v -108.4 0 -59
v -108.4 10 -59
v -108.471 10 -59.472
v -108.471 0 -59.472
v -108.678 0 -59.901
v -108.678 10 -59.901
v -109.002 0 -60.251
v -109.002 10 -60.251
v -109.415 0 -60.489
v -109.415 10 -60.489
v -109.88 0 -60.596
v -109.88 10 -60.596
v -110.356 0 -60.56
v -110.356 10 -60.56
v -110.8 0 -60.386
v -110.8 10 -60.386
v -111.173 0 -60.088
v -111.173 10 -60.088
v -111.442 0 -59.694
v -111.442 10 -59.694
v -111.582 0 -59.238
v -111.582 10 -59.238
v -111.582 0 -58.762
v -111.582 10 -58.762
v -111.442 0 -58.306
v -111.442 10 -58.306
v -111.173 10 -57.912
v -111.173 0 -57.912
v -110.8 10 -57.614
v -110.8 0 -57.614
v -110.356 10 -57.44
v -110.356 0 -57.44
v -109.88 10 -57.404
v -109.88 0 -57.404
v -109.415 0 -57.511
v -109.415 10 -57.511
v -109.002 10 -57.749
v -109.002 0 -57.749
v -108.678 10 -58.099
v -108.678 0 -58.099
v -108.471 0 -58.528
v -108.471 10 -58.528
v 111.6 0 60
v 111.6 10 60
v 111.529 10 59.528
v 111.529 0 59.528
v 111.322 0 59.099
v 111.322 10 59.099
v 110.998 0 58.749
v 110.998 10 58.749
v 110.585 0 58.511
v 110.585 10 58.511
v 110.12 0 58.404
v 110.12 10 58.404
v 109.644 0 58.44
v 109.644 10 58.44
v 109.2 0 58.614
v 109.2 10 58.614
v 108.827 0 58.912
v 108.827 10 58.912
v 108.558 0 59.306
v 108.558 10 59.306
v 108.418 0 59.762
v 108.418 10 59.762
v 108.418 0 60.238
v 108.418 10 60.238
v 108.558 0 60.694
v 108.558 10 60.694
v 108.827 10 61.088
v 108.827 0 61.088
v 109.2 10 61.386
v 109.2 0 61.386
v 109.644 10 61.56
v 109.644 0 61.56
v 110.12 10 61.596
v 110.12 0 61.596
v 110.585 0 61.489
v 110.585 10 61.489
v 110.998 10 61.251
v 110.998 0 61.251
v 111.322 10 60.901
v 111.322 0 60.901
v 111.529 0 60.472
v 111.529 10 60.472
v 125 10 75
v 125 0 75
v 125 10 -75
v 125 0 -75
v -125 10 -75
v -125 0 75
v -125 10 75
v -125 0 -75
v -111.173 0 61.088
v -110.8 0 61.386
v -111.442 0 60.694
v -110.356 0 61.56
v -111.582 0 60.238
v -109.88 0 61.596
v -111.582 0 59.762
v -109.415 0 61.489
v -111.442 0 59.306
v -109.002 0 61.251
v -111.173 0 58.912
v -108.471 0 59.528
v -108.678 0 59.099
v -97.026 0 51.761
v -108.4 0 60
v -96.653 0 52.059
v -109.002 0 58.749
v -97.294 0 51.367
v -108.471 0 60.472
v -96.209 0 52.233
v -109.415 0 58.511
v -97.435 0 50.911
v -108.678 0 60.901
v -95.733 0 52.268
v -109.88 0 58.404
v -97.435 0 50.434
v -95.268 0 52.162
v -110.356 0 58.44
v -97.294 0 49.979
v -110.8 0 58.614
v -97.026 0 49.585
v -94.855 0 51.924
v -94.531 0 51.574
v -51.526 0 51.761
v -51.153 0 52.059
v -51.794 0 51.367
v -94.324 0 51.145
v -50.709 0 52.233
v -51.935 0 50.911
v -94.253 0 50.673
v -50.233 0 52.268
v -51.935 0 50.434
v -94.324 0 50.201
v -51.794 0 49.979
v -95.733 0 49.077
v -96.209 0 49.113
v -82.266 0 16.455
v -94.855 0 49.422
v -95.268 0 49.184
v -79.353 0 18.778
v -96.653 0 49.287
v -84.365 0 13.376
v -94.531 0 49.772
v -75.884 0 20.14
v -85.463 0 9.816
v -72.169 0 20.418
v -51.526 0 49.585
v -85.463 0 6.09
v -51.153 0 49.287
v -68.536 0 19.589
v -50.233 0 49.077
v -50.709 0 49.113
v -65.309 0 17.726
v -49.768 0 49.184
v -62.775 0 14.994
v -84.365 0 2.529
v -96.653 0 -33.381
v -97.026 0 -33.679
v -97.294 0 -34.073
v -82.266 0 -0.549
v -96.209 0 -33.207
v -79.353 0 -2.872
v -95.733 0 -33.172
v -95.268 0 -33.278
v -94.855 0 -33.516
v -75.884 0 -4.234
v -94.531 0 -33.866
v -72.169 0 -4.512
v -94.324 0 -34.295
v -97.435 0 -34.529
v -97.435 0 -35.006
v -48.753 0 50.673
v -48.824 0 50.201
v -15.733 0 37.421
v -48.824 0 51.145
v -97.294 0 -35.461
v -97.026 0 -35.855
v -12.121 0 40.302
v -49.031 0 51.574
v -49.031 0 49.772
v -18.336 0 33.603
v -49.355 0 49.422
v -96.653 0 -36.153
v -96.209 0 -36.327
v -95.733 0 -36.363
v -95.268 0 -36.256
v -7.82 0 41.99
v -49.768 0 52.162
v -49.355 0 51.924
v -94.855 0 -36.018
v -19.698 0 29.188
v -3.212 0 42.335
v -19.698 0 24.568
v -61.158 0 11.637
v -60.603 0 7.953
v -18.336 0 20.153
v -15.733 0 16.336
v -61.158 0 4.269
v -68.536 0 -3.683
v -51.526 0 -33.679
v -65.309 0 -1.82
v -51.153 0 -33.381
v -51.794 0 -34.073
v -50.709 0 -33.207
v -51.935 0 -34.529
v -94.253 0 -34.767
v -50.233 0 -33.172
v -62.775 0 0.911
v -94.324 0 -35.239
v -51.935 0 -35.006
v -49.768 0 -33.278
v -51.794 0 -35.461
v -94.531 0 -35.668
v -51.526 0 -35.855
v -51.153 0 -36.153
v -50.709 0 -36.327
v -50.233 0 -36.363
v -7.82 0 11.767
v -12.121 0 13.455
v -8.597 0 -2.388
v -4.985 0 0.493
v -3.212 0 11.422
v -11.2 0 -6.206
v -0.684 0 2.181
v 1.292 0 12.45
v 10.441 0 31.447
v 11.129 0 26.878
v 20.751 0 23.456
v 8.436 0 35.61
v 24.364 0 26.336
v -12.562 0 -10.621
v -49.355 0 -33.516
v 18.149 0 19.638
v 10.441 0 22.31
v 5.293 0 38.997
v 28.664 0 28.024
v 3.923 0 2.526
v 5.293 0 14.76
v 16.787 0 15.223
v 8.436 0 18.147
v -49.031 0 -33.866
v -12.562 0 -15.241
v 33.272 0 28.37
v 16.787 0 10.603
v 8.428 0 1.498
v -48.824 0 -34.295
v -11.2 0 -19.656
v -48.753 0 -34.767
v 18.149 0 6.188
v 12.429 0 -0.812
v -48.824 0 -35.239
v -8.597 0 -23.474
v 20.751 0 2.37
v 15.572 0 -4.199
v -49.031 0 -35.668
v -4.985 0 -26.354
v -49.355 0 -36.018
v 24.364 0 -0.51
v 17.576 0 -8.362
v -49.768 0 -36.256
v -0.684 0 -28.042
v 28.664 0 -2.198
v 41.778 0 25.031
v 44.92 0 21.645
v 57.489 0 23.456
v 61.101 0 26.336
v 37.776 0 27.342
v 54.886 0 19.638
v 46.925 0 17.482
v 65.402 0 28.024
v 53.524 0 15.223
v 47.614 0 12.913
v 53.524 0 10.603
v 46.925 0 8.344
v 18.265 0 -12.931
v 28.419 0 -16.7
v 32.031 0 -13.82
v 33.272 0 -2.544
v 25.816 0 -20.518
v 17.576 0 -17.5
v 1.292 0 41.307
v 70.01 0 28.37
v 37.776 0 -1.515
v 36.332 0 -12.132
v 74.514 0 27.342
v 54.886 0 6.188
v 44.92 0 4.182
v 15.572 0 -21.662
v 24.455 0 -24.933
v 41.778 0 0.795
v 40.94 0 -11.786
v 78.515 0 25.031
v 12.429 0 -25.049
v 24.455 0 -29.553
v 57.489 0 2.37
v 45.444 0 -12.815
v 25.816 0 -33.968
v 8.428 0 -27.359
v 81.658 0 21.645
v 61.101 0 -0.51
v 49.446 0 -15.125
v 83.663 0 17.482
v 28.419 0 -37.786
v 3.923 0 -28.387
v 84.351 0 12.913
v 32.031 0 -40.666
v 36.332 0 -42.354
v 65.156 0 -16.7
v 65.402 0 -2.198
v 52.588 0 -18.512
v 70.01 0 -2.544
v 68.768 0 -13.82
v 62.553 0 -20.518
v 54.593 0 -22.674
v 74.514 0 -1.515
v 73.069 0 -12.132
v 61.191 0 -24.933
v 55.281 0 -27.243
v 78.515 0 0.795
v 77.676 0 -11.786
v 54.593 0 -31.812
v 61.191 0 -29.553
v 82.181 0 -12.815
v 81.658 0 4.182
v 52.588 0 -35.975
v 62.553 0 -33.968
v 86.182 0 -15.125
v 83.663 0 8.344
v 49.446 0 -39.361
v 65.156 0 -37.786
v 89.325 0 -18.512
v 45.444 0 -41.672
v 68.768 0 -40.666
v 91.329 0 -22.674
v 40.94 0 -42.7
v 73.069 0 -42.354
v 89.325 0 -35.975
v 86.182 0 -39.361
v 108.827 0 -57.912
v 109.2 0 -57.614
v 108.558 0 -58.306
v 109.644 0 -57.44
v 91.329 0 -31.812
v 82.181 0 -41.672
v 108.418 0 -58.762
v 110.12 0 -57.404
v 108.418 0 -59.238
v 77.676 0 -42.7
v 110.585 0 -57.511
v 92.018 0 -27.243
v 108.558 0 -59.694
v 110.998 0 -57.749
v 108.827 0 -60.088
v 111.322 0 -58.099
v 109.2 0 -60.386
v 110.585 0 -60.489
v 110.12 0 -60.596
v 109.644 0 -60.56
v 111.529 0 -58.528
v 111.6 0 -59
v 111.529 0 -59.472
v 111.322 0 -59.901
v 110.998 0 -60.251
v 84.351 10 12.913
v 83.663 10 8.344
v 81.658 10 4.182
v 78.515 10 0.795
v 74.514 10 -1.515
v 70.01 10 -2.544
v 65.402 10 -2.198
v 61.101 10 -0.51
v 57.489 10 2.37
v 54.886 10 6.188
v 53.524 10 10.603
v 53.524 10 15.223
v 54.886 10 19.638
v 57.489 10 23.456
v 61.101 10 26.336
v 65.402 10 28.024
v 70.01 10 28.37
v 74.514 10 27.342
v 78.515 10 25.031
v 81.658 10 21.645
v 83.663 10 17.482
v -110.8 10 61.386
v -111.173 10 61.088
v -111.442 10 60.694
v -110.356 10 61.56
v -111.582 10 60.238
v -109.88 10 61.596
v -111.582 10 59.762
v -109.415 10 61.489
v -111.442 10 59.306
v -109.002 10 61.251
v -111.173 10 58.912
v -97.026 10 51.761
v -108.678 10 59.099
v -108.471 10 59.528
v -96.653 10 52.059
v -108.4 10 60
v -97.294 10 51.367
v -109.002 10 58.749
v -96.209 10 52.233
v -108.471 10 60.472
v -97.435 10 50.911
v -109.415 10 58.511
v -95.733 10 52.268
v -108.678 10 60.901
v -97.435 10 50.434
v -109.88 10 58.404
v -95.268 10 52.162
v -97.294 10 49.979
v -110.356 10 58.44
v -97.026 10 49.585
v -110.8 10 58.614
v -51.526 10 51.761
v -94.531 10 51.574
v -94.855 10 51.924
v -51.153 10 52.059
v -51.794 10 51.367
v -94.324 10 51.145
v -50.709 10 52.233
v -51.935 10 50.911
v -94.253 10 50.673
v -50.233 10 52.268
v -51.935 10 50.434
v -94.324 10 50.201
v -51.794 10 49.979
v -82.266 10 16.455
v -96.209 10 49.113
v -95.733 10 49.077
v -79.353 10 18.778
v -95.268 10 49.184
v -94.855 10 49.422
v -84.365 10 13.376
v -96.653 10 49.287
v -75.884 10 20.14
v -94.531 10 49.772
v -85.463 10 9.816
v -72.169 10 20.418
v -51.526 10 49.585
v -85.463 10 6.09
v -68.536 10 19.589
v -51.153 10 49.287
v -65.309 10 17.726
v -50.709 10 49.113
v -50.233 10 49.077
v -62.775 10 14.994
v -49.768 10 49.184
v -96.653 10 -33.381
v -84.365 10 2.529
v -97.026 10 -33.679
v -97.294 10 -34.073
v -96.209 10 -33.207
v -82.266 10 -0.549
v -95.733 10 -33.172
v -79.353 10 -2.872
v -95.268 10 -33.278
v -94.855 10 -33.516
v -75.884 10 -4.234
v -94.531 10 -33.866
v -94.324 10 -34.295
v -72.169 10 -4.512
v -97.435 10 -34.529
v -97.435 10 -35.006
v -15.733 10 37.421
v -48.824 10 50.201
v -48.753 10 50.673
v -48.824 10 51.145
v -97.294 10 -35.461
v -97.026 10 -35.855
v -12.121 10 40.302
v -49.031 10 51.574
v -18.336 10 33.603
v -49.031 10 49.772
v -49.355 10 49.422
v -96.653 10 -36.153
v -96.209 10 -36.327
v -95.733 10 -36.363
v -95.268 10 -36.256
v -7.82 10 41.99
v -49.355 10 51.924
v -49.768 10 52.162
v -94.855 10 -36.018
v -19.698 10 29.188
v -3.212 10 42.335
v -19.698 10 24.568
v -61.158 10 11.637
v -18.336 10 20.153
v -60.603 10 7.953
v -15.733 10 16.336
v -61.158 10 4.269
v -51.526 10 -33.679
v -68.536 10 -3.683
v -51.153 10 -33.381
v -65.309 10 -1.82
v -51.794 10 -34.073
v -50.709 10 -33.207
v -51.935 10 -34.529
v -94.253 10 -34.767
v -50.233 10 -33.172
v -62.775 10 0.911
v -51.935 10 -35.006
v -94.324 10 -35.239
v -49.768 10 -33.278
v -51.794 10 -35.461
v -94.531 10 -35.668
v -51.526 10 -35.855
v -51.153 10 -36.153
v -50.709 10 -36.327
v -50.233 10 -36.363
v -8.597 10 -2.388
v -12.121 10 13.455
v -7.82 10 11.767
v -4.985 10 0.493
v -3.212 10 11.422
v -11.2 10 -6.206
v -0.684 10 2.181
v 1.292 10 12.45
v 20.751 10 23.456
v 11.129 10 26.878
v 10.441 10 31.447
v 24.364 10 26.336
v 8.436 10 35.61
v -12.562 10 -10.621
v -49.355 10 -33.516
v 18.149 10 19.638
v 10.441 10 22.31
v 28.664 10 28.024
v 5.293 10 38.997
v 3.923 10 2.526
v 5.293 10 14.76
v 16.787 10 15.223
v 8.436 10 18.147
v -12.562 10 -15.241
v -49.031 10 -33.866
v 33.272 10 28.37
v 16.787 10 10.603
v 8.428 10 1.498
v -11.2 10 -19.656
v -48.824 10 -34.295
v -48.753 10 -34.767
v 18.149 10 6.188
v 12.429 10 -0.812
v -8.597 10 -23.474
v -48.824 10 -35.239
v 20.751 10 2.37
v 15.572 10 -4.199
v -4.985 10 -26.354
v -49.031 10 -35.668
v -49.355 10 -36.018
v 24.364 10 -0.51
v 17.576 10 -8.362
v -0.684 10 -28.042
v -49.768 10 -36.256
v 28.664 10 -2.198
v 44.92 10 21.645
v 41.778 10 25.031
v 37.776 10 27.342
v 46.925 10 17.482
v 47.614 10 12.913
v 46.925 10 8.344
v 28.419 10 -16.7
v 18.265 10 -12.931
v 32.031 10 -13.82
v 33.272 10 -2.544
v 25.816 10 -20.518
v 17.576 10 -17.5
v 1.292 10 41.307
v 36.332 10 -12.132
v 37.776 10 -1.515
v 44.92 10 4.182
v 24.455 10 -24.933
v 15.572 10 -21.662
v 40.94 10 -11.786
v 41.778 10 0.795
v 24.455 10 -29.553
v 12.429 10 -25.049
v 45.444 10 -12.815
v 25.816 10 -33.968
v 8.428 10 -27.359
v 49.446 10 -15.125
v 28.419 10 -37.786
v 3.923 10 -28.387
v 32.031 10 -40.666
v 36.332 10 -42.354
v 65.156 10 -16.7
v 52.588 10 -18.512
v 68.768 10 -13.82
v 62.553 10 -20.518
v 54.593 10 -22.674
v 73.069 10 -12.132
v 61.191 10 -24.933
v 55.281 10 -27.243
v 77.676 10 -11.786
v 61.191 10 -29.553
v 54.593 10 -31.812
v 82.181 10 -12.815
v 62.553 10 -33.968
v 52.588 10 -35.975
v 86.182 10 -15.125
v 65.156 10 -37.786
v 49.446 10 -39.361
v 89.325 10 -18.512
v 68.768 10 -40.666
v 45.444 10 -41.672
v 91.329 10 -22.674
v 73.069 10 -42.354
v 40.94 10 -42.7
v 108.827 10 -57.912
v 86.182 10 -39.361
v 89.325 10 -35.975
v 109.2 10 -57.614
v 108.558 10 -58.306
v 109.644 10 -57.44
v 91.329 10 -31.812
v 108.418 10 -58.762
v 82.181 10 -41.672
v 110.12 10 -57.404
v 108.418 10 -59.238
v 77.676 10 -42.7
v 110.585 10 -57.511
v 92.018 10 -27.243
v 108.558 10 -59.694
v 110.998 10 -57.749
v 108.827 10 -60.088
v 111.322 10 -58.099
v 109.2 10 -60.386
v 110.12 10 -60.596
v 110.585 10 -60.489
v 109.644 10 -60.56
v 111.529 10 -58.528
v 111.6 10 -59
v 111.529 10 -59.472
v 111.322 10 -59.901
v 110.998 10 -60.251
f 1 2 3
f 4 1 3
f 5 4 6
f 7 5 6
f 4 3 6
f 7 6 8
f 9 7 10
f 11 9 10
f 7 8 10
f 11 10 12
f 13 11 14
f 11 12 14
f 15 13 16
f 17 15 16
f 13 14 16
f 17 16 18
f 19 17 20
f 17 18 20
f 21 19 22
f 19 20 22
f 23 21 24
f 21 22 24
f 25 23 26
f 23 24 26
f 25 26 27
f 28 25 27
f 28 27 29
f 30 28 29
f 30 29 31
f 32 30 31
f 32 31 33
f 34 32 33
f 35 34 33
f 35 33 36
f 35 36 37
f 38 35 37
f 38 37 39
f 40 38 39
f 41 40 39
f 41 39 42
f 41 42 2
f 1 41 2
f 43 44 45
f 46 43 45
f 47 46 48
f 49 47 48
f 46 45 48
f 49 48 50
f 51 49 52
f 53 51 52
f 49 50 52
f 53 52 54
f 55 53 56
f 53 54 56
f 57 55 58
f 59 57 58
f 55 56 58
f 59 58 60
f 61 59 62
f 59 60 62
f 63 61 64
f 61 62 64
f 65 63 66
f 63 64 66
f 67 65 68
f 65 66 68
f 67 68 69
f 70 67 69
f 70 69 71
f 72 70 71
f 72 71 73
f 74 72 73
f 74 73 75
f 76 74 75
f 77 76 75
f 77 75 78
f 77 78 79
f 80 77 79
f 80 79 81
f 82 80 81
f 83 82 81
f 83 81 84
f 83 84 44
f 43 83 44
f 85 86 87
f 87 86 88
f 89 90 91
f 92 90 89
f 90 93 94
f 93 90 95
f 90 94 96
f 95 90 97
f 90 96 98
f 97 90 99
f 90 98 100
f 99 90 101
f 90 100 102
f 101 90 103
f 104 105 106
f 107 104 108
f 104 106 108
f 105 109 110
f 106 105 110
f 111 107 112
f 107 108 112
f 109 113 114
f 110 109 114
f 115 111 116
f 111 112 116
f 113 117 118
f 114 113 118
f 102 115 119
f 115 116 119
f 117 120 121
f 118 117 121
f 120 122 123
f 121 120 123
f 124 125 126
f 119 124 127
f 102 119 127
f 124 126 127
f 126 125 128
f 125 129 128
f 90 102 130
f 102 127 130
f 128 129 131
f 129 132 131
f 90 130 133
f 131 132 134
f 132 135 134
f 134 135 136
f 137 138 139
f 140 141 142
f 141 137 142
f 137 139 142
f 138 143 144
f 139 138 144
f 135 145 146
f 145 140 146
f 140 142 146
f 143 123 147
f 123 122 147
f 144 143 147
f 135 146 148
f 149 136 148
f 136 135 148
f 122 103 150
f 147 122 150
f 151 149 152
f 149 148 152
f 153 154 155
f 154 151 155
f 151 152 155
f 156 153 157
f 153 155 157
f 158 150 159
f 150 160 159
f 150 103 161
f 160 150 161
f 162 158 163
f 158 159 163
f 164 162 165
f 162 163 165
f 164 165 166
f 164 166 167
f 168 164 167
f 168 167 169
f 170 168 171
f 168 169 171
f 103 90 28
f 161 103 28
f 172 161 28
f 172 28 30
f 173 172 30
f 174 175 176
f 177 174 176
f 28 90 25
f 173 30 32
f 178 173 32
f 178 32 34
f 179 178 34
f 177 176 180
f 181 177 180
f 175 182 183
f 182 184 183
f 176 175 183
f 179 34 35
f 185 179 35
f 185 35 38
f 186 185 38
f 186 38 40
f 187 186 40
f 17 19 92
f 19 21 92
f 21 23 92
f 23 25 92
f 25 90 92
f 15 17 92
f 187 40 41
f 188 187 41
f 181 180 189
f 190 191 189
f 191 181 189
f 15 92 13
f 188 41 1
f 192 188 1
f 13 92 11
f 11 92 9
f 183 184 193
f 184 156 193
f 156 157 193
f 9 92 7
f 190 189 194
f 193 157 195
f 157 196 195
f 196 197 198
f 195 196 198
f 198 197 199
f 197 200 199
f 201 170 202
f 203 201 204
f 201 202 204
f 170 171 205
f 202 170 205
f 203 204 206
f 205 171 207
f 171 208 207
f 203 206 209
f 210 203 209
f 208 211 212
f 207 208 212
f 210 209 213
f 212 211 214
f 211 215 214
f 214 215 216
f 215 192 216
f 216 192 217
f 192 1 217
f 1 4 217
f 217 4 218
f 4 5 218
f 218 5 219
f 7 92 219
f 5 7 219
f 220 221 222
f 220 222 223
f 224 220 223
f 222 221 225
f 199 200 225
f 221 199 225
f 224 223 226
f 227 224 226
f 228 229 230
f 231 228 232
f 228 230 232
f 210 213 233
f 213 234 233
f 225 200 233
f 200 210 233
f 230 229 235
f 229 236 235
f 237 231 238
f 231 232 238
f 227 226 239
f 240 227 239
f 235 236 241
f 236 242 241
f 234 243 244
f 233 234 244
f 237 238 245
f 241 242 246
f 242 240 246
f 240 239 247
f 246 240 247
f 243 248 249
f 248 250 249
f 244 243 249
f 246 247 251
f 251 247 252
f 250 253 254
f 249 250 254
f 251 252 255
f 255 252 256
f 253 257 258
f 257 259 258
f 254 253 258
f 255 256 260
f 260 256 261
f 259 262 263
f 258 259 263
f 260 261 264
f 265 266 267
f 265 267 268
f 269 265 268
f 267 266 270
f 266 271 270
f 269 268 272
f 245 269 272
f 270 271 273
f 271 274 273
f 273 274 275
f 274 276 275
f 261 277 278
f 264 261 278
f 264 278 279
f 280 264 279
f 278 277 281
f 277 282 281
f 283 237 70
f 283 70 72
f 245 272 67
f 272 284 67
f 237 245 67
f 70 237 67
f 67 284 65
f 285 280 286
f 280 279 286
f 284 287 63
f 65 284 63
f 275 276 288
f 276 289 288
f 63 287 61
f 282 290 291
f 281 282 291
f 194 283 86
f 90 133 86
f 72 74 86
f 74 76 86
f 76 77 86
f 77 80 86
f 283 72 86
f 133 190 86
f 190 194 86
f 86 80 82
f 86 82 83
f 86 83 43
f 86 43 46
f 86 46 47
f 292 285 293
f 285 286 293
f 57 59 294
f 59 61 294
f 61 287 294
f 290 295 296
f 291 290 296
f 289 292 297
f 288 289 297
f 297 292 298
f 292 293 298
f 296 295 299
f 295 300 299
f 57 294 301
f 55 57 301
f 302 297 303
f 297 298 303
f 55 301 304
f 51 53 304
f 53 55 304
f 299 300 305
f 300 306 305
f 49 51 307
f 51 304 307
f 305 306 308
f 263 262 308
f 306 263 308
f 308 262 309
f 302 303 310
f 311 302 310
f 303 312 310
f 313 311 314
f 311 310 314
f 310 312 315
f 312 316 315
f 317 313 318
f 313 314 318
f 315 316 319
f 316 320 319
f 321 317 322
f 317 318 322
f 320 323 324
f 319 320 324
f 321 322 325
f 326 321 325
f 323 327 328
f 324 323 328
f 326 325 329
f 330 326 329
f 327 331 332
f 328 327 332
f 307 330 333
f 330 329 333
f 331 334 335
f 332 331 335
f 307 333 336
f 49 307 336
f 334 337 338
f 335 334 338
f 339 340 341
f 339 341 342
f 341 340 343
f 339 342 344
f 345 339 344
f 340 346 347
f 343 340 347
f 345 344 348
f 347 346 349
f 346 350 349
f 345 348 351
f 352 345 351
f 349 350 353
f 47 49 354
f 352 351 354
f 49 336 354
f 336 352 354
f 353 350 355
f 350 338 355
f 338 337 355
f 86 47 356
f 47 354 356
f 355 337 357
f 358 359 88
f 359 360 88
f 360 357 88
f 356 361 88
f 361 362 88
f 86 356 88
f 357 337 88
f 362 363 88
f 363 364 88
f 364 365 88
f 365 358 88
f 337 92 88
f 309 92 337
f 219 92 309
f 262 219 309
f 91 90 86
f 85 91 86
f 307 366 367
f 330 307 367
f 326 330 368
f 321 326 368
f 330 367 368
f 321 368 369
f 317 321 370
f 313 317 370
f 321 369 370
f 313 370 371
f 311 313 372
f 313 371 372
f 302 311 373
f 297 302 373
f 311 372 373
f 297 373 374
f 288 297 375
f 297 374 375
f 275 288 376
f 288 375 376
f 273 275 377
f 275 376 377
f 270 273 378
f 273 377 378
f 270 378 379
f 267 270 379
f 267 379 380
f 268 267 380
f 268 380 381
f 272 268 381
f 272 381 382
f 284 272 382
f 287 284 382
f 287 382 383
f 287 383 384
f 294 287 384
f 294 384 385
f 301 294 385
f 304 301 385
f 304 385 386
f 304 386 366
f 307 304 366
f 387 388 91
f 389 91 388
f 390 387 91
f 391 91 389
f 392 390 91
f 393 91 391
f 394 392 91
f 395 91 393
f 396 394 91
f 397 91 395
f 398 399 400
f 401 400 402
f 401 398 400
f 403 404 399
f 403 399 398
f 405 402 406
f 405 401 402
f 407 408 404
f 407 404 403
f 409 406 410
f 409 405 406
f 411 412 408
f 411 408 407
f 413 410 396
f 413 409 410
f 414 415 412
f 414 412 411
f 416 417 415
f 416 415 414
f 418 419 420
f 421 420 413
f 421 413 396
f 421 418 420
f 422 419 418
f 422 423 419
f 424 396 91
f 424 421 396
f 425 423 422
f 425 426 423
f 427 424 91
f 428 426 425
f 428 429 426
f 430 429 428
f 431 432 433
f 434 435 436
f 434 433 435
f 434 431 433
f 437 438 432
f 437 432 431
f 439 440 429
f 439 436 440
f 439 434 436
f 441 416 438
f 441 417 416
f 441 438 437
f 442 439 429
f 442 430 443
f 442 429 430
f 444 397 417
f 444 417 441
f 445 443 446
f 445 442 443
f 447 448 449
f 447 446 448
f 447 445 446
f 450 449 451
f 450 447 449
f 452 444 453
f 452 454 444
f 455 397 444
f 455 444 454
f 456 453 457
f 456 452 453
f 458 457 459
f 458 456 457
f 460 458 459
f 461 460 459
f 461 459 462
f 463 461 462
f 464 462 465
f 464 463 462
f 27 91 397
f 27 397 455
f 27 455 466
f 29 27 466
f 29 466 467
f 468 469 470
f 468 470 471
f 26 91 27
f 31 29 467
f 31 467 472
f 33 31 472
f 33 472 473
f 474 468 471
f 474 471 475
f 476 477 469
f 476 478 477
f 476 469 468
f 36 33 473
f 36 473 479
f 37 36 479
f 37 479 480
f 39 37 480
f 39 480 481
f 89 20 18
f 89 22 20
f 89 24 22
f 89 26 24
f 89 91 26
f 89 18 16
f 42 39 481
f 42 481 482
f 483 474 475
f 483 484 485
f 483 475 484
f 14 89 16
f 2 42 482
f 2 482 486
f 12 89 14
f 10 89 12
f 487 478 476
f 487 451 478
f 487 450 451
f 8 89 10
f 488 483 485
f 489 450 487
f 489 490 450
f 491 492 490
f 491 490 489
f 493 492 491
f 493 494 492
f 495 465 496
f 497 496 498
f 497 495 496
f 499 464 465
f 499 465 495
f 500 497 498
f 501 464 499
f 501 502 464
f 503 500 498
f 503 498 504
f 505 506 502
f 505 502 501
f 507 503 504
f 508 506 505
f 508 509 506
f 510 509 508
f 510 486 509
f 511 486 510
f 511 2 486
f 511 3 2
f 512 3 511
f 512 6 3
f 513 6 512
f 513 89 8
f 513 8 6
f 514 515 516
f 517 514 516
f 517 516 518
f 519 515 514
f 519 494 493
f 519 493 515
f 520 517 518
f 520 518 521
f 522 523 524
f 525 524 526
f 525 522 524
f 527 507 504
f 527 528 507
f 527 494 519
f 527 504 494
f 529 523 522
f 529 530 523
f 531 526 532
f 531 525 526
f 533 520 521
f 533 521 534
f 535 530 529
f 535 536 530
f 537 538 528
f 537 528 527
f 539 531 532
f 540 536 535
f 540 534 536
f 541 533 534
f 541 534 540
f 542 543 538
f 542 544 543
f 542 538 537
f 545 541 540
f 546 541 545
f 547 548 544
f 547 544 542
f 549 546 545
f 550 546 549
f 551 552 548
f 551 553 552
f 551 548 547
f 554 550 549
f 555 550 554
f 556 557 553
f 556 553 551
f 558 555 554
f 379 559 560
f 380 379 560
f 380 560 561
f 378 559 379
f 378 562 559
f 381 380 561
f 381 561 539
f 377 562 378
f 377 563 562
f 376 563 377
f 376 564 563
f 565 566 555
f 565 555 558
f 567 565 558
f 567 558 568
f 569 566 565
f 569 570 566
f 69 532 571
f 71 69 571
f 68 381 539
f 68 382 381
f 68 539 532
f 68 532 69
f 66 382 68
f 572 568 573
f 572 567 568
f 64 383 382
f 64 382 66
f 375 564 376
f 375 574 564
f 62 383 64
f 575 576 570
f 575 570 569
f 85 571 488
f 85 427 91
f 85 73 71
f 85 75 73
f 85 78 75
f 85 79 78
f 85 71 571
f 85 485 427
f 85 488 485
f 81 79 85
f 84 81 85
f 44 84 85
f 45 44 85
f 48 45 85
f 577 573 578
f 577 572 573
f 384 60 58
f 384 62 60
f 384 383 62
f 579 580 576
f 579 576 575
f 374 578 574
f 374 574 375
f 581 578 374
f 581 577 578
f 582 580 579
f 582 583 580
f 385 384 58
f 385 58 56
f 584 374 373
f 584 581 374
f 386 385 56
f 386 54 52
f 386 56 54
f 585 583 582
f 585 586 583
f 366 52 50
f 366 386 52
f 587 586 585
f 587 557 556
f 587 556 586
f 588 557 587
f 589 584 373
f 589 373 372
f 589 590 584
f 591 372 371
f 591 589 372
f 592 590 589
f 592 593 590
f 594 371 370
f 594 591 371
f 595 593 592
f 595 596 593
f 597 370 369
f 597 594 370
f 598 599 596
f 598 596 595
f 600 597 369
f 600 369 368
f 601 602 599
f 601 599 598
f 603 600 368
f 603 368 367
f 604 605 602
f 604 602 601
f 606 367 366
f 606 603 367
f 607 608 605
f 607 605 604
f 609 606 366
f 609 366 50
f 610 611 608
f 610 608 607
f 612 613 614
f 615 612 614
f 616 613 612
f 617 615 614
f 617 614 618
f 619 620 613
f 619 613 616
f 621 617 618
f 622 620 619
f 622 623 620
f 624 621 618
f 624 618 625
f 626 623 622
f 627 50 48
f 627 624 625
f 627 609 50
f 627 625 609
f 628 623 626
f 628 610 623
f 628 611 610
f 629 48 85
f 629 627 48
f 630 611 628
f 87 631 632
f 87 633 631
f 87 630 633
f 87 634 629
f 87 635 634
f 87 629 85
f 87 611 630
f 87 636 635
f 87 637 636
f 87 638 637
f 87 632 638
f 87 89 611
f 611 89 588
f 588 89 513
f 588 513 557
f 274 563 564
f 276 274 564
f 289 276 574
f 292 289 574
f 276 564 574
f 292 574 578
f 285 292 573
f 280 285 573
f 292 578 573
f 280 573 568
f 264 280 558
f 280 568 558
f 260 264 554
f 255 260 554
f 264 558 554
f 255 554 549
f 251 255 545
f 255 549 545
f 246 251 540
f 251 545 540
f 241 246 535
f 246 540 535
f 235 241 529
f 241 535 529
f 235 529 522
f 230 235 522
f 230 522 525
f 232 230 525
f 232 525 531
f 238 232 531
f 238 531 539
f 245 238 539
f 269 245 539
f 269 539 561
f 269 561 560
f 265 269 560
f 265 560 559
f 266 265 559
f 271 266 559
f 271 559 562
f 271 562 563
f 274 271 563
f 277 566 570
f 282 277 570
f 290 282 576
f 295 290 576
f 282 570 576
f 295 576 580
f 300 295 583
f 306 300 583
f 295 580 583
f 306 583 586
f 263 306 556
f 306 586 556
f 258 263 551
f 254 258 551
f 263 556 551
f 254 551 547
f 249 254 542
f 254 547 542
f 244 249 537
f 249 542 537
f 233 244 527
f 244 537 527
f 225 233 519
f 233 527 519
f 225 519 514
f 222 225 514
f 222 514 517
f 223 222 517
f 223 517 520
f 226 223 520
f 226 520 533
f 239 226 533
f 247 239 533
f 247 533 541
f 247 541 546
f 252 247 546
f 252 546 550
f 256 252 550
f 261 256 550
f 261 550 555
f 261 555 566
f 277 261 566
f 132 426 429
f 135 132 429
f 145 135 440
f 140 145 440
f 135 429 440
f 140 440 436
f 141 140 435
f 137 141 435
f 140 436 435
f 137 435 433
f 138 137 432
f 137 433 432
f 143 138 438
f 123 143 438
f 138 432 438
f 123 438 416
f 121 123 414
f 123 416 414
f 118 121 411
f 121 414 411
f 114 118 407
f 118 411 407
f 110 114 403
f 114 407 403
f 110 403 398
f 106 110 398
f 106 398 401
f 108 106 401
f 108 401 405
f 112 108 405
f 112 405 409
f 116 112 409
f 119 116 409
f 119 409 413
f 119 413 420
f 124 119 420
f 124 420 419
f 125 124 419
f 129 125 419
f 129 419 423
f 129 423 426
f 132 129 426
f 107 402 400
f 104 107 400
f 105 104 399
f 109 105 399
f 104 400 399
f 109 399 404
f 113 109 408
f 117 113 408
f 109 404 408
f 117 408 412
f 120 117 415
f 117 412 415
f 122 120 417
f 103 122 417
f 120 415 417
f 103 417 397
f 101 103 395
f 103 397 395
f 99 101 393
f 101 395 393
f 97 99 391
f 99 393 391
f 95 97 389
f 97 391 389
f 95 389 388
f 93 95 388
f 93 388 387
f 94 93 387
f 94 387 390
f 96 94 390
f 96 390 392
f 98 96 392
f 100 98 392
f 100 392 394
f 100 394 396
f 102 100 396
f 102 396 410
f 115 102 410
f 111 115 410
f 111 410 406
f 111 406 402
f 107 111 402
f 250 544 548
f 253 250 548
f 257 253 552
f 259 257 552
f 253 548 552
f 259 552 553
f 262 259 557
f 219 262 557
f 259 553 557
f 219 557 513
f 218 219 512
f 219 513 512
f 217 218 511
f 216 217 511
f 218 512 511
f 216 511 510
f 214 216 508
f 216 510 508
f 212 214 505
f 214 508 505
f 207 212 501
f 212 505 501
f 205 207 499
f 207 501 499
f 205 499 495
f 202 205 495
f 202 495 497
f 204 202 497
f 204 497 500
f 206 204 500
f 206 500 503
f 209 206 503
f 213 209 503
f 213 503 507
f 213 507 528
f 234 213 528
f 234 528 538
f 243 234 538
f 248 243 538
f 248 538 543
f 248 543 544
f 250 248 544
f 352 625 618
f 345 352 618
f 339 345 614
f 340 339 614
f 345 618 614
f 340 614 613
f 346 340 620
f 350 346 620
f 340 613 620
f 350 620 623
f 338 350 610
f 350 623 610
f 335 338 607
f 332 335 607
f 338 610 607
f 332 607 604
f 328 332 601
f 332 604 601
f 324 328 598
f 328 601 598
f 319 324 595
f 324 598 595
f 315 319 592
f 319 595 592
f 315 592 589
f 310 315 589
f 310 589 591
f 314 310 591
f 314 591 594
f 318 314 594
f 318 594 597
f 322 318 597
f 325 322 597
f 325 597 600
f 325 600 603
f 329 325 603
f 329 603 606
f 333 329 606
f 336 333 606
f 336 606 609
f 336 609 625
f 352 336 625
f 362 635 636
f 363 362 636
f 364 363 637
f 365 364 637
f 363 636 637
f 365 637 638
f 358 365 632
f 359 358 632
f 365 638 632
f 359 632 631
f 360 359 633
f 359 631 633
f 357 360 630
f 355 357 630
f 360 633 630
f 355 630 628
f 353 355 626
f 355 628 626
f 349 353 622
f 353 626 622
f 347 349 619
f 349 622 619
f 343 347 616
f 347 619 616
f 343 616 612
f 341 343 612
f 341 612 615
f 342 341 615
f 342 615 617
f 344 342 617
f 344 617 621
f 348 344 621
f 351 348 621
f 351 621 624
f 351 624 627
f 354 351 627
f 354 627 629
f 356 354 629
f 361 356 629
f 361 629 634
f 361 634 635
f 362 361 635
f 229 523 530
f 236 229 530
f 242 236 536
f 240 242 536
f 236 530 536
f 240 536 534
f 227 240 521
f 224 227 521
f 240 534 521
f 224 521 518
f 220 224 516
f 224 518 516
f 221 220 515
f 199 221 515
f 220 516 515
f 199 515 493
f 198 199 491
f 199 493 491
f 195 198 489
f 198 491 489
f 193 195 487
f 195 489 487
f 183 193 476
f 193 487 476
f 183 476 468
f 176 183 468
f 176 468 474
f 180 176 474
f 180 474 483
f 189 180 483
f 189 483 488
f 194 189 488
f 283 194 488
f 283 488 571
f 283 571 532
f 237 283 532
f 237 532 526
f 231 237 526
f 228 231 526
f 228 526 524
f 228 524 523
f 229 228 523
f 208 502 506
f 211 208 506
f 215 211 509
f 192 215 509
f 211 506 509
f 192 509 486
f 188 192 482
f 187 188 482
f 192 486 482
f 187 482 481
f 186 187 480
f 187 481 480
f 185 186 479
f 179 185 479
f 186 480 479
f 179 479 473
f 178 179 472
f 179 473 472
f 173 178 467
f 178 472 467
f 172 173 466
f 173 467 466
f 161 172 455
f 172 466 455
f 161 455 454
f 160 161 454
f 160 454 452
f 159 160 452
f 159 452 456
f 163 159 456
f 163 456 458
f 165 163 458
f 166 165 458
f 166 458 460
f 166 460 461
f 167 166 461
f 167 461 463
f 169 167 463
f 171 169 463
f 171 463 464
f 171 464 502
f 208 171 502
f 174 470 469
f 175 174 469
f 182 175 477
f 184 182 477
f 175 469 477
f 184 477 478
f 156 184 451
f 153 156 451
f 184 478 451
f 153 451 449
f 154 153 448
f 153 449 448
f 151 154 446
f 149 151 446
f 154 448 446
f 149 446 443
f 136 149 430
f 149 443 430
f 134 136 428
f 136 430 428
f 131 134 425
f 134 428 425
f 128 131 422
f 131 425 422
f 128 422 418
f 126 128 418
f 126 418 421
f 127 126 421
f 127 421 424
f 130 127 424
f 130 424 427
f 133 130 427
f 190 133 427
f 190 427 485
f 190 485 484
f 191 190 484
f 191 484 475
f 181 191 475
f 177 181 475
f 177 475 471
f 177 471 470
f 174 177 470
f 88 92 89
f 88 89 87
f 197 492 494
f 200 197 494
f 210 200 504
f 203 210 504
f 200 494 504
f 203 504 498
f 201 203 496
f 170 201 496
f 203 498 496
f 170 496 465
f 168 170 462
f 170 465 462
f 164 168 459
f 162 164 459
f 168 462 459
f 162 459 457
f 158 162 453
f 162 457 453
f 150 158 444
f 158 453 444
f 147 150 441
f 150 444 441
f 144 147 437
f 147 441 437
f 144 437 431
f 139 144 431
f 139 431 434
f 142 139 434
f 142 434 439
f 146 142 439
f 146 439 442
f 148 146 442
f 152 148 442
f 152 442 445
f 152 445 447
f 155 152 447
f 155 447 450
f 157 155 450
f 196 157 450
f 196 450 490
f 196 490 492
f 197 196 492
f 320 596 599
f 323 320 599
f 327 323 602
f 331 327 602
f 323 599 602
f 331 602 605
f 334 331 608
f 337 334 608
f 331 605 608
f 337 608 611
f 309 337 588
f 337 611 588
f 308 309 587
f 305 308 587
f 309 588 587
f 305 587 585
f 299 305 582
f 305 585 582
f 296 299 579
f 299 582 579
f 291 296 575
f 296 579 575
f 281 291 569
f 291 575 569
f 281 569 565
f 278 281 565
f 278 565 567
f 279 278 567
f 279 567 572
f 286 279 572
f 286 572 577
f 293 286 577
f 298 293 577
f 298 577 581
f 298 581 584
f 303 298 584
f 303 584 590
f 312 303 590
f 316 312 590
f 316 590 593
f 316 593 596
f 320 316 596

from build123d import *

# Parameters (mm, degrees)
CROQUIS1_W              = 250
CROQUIS1_H              = 150
SALIENTE_EXTRUIR1_DEPTH = 10
CORTAR_EXTRUIR1_REACH   = 12
CROQUIS2_R              = 12.5
CROQUIS2_R_2            = 15.5
CORTAR_EXTRUIR2_REACH   = 12
CROQUIS3_R              = 1.6


with BuildPart() as part:
    # Croquis1 → Saliente-Extruir1 (new body)
    with BuildSketch(Plane(origin=(0, 0, 0), x_dir=(1, 0, 0), z_dir=(0, 1, 0))):
        Rectangle(CROQUIS1_W, CROQUIS1_H)
    extrude(amount=SALIENTE_EXTRUIR1_DEPTH)

    # Croquis2 → Cortar-Extruir1 (cut, up to next)
    with BuildSketch(Plane(origin=(0, 10, 0), x_dir=(1, 0, 0), z_dir=(0, 1, 0)), mode=Mode.PRIVATE) as cortar_extruir1_sk1:
        with Locations((-73.102687588, -7.952940163)):
            Circle(CROQUIS2_R)
    cortar_extruir1_tool1 = extrude(cortar_extruir1_sk1.sketch, amount=-CORTAR_EXTRUIR1_REACH, mode=Mode.PRIVATE) & part.part
    add(cortar_extruir1_tool1.solids().sort_by_distance((-73.102688, 10, 7.95294))[0], mode=Mode.SUBTRACT)
    # Croquis2 → Cortar-Extruir1 (cut, up to next)
    with BuildSketch(Plane(origin=(0, 10, 0), x_dir=(1, 0, 0), z_dir=(0, 1, 0)), mode=Mode.PRIVATE) as cortar_extruir1_sk2:
        with Locations((-4.370803181, -26.878296525)):
            Circle(CROQUIS2_R_2)
    cortar_extruir1_tool2 = extrude(cortar_extruir1_sk2.sketch, amount=-CORTAR_EXTRUIR1_REACH, mode=Mode.PRIVATE) & part.part
    add(cortar_extruir1_tool2.solids().sort_by_distance((-4.370803, 10, 26.878297))[0], mode=Mode.SUBTRACT)
    # Croquis2 → Cortar-Extruir1 (cut, up to next)
    with BuildSketch(Plane(origin=(0, 10, 0), x_dir=(1, 0, 0), z_dir=(0, 1, 0)), mode=Mode.PRIVATE) as cortar_extruir1_sk3:
        with Locations((2.765040009, 12.93083036)):
            Circle(CROQUIS2_R_2)
    cortar_extruir1_tool3 = extrude(cortar_extruir1_sk3.sketch, amount=-CORTAR_EXTRUIR1_REACH, mode=Mode.PRIVATE) & part.part
    add(cortar_extruir1_tool3.solids().sort_by_distance((2.76504, 10, -12.93083))[0], mode=Mode.SUBTRACT)
    # Croquis2 → Cortar-Extruir1 (cut, up to next)
    with BuildSketch(Plane(origin=(0, 10, 0), x_dir=(1, 0, 0), z_dir=(0, 1, 0)), mode=Mode.PRIVATE) as cortar_extruir1_sk4:
        with Locations((39.781486463, 27.243051559)):
            Circle(CROQUIS2_R_2)
    cortar_extruir1_tool4 = extrude(cortar_extruir1_sk4.sketch, amount=-CORTAR_EXTRUIR1_REACH, mode=Mode.PRIVATE) & part.part
    add(cortar_extruir1_tool4.solids().sort_by_distance((39.781486, 10, -27.243052))[0], mode=Mode.SUBTRACT)
    # Croquis2 → Cortar-Extruir1 (cut, up to next)
    with BuildSketch(Plane(origin=(0, 10, 0), x_dir=(1, 0, 0), z_dir=(0, 1, 0)), mode=Mode.PRIVATE) as cortar_extruir1_sk5:
        with Locations((76.517860202, 27.243051559)):
            Circle(CROQUIS2_R_2)
    cortar_extruir1_tool5 = extrude(cortar_extruir1_sk5.sketch, amount=-CORTAR_EXTRUIR1_REACH, mode=Mode.PRIVATE) & part.part
    add(cortar_extruir1_tool5.solids().sort_by_distance((76.51786, 10, -27.243052))[0], mode=Mode.SUBTRACT)
    # Croquis2 → Cortar-Extruir1 (cut, up to next)
    with BuildSketch(Plane(origin=(0, 10, 0), x_dir=(1, 0, 0), z_dir=(0, 1, 0)), mode=Mode.PRIVATE) as cortar_extruir1_sk6:
        with Locations((68.851282971, -12.913044543)):
            Circle(CROQUIS2_R_2)
    cortar_extruir1_tool6 = extrude(cortar_extruir1_sk6.sketch, amount=-CORTAR_EXTRUIR1_REACH, mode=Mode.PRIVATE) & part.part
    add(cortar_extruir1_tool6.solids().sort_by_distance((68.851283, 10, 12.913045))[0], mode=Mode.SUBTRACT)
    # Croquis2 → Cortar-Extruir1 (cut, up to next)
    with BuildSketch(Plane(origin=(0, 10, 0), x_dir=(1, 0, 0), z_dir=(0, 1, 0)), mode=Mode.PRIVATE) as cortar_extruir1_sk7:
        with Locations((32.113542958, -12.913044543)):
            Circle(CROQUIS2_R_2)
    cortar_extruir1_tool7 = extrude(cortar_extruir1_sk7.sketch, amount=-CORTAR_EXTRUIR1_REACH, mode=Mode.PRIVATE) & part.part
    add(cortar_extruir1_tool7.solids().sort_by_distance((32.113543, 10, 12.913045))[0], mode=Mode.SUBTRACT)

    # Croquis3 → Cortar-Extruir2 (cut, up to next)
    with BuildSketch(Plane(origin=(0, 10, 0), x_dir=(1, 0, 0), z_dir=(0, 1, 0)), mode=Mode.PRIVATE) as cortar_extruir2_sk1:
        with Locations((-110, 59)):
            Circle(CROQUIS3_R)
    cortar_extruir2_tool1 = extrude(cortar_extruir2_sk1.sketch, amount=-CORTAR_EXTRUIR2_REACH, mode=Mode.PRIVATE) & part.part
    add(cortar_extruir2_tool1.solids().sort_by_distance((-110, 10, -59))[0], mode=Mode.SUBTRACT)
    # Croquis3 → Cortar-Extruir2 (cut, up to next)
    with BuildSketch(Plane(origin=(0, 10, 0), x_dir=(1, 0, 0), z_dir=(0, 1, 0)), mode=Mode.PRIVATE) as cortar_extruir2_sk2:
        with Locations((110, 59)):
            Circle(CROQUIS3_R)
    cortar_extruir2_tool2 = extrude(cortar_extruir2_sk2.sketch, amount=-CORTAR_EXTRUIR2_REACH, mode=Mode.PRIVATE) & part.part
    add(cortar_extruir2_tool2.solids().sort_by_distance((110, 10, -59))[0], mode=Mode.SUBTRACT)
    # Croquis3 → Cortar-Extruir2 (cut, up to next)
    with BuildSketch(Plane(origin=(0, 10, 0), x_dir=(1, 0, 0), z_dir=(0, 1, 0)), mode=Mode.PRIVATE) as cortar_extruir2_sk3:
        with Locations((110, -60)):
            Circle(CROQUIS3_R)
    cortar_extruir2_tool3 = extrude(cortar_extruir2_sk3.sketch, amount=-CORTAR_EXTRUIR2_REACH, mode=Mode.PRIVATE) & part.part
    add(cortar_extruir2_tool3.solids().sort_by_distance((110, 10, 60))[0], mode=Mode.SUBTRACT)
    # Croquis3 → Cortar-Extruir2 (cut, up to next)
    with BuildSketch(Plane(origin=(0, 10, 0), x_dir=(1, 0, 0), z_dir=(0, 1, 0)), mode=Mode.PRIVATE) as cortar_extruir2_sk4:
        with Locations((-110, -60)):
            Circle(CROQUIS3_R)
    cortar_extruir2_tool4 = extrude(cortar_extruir2_sk4.sketch, amount=-CORTAR_EXTRUIR2_REACH, mode=Mode.PRIVATE) & part.part
    add(cortar_extruir2_tool4.solids().sort_by_distance((-110, 10, 60))[0], mode=Mode.SUBTRACT)
    # Croquis3 → Cortar-Extruir2 (cut, up to next)
    with BuildSketch(Plane(origin=(0, 10, 0), x_dir=(1, 0, 0), z_dir=(0, 1, 0)), mode=Mode.PRIVATE) as cortar_extruir2_sk5:
        with Locations((-50.352687588, 34.767059837)):
            Circle(CROQUIS3_R)
    cortar_extruir2_tool5 = extrude(cortar_extruir2_sk5.sketch, amount=-CORTAR_EXTRUIR2_REACH, mode=Mode.PRIVATE) & part.part
    add(cortar_extruir2_tool5.solids().sort_by_distance((-50.352688, 10, -34.76706))[0], mode=Mode.SUBTRACT)
    # Croquis3 → Cortar-Extruir2 (cut, up to next)
    with BuildSketch(Plane(origin=(0, 10, 0), x_dir=(1, 0, 0), z_dir=(0, 1, 0)), mode=Mode.PRIVATE) as cortar_extruir2_sk6:
        with Locations((-50.352687588, -50.672940163)):
            Circle(CROQUIS3_R)
    cortar_extruir2_tool6 = extrude(cortar_extruir2_sk6.sketch, amount=-CORTAR_EXTRUIR2_REACH, mode=Mode.PRIVATE) & part.part
    add(cortar_extruir2_tool6.solids().sort_by_distance((-50.352688, 10, 50.67294))[0], mode=Mode.SUBTRACT)
    # Croquis3 → Cortar-Extruir2 (cut, up to next)
    with BuildSketch(Plane(origin=(0, 10, 0), x_dir=(1, 0, 0), z_dir=(0, 1, 0)), mode=Mode.PRIVATE) as cortar_extruir2_sk7:
        with Locations((-95.852687588, -50.672940163)):
            Circle(CROQUIS3_R)
    cortar_extruir2_tool7 = extrude(cortar_extruir2_sk7.sketch, amount=-CORTAR_EXTRUIR2_REACH, mode=Mode.PRIVATE) & part.part
    add(cortar_extruir2_tool7.solids().sort_by_distance((-95.852688, 10, 50.67294))[0], mode=Mode.SUBTRACT)
    # Croquis3 → Cortar-Extruir2 (cut, up to next)
    with BuildSketch(Plane(origin=(0, 10, 0), x_dir=(1, 0, 0), z_dir=(0, 1, 0)), mode=Mode.PRIVATE) as cortar_extruir2_sk8:
        with Locations((-95.852687588, 34.767059837)):
            Circle(CROQUIS3_R)
    cortar_extruir2_tool8 = extrude(cortar_extruir2_sk8.sketch, amount=-CORTAR_EXTRUIR2_REACH, mode=Mode.PRIVATE) & part.part
    add(cortar_extruir2_tool8.solids().sort_by_distance((-95.852688, 10, -34.76706))[0], mode=Mode.SUBTRACT)


solid = part.part
